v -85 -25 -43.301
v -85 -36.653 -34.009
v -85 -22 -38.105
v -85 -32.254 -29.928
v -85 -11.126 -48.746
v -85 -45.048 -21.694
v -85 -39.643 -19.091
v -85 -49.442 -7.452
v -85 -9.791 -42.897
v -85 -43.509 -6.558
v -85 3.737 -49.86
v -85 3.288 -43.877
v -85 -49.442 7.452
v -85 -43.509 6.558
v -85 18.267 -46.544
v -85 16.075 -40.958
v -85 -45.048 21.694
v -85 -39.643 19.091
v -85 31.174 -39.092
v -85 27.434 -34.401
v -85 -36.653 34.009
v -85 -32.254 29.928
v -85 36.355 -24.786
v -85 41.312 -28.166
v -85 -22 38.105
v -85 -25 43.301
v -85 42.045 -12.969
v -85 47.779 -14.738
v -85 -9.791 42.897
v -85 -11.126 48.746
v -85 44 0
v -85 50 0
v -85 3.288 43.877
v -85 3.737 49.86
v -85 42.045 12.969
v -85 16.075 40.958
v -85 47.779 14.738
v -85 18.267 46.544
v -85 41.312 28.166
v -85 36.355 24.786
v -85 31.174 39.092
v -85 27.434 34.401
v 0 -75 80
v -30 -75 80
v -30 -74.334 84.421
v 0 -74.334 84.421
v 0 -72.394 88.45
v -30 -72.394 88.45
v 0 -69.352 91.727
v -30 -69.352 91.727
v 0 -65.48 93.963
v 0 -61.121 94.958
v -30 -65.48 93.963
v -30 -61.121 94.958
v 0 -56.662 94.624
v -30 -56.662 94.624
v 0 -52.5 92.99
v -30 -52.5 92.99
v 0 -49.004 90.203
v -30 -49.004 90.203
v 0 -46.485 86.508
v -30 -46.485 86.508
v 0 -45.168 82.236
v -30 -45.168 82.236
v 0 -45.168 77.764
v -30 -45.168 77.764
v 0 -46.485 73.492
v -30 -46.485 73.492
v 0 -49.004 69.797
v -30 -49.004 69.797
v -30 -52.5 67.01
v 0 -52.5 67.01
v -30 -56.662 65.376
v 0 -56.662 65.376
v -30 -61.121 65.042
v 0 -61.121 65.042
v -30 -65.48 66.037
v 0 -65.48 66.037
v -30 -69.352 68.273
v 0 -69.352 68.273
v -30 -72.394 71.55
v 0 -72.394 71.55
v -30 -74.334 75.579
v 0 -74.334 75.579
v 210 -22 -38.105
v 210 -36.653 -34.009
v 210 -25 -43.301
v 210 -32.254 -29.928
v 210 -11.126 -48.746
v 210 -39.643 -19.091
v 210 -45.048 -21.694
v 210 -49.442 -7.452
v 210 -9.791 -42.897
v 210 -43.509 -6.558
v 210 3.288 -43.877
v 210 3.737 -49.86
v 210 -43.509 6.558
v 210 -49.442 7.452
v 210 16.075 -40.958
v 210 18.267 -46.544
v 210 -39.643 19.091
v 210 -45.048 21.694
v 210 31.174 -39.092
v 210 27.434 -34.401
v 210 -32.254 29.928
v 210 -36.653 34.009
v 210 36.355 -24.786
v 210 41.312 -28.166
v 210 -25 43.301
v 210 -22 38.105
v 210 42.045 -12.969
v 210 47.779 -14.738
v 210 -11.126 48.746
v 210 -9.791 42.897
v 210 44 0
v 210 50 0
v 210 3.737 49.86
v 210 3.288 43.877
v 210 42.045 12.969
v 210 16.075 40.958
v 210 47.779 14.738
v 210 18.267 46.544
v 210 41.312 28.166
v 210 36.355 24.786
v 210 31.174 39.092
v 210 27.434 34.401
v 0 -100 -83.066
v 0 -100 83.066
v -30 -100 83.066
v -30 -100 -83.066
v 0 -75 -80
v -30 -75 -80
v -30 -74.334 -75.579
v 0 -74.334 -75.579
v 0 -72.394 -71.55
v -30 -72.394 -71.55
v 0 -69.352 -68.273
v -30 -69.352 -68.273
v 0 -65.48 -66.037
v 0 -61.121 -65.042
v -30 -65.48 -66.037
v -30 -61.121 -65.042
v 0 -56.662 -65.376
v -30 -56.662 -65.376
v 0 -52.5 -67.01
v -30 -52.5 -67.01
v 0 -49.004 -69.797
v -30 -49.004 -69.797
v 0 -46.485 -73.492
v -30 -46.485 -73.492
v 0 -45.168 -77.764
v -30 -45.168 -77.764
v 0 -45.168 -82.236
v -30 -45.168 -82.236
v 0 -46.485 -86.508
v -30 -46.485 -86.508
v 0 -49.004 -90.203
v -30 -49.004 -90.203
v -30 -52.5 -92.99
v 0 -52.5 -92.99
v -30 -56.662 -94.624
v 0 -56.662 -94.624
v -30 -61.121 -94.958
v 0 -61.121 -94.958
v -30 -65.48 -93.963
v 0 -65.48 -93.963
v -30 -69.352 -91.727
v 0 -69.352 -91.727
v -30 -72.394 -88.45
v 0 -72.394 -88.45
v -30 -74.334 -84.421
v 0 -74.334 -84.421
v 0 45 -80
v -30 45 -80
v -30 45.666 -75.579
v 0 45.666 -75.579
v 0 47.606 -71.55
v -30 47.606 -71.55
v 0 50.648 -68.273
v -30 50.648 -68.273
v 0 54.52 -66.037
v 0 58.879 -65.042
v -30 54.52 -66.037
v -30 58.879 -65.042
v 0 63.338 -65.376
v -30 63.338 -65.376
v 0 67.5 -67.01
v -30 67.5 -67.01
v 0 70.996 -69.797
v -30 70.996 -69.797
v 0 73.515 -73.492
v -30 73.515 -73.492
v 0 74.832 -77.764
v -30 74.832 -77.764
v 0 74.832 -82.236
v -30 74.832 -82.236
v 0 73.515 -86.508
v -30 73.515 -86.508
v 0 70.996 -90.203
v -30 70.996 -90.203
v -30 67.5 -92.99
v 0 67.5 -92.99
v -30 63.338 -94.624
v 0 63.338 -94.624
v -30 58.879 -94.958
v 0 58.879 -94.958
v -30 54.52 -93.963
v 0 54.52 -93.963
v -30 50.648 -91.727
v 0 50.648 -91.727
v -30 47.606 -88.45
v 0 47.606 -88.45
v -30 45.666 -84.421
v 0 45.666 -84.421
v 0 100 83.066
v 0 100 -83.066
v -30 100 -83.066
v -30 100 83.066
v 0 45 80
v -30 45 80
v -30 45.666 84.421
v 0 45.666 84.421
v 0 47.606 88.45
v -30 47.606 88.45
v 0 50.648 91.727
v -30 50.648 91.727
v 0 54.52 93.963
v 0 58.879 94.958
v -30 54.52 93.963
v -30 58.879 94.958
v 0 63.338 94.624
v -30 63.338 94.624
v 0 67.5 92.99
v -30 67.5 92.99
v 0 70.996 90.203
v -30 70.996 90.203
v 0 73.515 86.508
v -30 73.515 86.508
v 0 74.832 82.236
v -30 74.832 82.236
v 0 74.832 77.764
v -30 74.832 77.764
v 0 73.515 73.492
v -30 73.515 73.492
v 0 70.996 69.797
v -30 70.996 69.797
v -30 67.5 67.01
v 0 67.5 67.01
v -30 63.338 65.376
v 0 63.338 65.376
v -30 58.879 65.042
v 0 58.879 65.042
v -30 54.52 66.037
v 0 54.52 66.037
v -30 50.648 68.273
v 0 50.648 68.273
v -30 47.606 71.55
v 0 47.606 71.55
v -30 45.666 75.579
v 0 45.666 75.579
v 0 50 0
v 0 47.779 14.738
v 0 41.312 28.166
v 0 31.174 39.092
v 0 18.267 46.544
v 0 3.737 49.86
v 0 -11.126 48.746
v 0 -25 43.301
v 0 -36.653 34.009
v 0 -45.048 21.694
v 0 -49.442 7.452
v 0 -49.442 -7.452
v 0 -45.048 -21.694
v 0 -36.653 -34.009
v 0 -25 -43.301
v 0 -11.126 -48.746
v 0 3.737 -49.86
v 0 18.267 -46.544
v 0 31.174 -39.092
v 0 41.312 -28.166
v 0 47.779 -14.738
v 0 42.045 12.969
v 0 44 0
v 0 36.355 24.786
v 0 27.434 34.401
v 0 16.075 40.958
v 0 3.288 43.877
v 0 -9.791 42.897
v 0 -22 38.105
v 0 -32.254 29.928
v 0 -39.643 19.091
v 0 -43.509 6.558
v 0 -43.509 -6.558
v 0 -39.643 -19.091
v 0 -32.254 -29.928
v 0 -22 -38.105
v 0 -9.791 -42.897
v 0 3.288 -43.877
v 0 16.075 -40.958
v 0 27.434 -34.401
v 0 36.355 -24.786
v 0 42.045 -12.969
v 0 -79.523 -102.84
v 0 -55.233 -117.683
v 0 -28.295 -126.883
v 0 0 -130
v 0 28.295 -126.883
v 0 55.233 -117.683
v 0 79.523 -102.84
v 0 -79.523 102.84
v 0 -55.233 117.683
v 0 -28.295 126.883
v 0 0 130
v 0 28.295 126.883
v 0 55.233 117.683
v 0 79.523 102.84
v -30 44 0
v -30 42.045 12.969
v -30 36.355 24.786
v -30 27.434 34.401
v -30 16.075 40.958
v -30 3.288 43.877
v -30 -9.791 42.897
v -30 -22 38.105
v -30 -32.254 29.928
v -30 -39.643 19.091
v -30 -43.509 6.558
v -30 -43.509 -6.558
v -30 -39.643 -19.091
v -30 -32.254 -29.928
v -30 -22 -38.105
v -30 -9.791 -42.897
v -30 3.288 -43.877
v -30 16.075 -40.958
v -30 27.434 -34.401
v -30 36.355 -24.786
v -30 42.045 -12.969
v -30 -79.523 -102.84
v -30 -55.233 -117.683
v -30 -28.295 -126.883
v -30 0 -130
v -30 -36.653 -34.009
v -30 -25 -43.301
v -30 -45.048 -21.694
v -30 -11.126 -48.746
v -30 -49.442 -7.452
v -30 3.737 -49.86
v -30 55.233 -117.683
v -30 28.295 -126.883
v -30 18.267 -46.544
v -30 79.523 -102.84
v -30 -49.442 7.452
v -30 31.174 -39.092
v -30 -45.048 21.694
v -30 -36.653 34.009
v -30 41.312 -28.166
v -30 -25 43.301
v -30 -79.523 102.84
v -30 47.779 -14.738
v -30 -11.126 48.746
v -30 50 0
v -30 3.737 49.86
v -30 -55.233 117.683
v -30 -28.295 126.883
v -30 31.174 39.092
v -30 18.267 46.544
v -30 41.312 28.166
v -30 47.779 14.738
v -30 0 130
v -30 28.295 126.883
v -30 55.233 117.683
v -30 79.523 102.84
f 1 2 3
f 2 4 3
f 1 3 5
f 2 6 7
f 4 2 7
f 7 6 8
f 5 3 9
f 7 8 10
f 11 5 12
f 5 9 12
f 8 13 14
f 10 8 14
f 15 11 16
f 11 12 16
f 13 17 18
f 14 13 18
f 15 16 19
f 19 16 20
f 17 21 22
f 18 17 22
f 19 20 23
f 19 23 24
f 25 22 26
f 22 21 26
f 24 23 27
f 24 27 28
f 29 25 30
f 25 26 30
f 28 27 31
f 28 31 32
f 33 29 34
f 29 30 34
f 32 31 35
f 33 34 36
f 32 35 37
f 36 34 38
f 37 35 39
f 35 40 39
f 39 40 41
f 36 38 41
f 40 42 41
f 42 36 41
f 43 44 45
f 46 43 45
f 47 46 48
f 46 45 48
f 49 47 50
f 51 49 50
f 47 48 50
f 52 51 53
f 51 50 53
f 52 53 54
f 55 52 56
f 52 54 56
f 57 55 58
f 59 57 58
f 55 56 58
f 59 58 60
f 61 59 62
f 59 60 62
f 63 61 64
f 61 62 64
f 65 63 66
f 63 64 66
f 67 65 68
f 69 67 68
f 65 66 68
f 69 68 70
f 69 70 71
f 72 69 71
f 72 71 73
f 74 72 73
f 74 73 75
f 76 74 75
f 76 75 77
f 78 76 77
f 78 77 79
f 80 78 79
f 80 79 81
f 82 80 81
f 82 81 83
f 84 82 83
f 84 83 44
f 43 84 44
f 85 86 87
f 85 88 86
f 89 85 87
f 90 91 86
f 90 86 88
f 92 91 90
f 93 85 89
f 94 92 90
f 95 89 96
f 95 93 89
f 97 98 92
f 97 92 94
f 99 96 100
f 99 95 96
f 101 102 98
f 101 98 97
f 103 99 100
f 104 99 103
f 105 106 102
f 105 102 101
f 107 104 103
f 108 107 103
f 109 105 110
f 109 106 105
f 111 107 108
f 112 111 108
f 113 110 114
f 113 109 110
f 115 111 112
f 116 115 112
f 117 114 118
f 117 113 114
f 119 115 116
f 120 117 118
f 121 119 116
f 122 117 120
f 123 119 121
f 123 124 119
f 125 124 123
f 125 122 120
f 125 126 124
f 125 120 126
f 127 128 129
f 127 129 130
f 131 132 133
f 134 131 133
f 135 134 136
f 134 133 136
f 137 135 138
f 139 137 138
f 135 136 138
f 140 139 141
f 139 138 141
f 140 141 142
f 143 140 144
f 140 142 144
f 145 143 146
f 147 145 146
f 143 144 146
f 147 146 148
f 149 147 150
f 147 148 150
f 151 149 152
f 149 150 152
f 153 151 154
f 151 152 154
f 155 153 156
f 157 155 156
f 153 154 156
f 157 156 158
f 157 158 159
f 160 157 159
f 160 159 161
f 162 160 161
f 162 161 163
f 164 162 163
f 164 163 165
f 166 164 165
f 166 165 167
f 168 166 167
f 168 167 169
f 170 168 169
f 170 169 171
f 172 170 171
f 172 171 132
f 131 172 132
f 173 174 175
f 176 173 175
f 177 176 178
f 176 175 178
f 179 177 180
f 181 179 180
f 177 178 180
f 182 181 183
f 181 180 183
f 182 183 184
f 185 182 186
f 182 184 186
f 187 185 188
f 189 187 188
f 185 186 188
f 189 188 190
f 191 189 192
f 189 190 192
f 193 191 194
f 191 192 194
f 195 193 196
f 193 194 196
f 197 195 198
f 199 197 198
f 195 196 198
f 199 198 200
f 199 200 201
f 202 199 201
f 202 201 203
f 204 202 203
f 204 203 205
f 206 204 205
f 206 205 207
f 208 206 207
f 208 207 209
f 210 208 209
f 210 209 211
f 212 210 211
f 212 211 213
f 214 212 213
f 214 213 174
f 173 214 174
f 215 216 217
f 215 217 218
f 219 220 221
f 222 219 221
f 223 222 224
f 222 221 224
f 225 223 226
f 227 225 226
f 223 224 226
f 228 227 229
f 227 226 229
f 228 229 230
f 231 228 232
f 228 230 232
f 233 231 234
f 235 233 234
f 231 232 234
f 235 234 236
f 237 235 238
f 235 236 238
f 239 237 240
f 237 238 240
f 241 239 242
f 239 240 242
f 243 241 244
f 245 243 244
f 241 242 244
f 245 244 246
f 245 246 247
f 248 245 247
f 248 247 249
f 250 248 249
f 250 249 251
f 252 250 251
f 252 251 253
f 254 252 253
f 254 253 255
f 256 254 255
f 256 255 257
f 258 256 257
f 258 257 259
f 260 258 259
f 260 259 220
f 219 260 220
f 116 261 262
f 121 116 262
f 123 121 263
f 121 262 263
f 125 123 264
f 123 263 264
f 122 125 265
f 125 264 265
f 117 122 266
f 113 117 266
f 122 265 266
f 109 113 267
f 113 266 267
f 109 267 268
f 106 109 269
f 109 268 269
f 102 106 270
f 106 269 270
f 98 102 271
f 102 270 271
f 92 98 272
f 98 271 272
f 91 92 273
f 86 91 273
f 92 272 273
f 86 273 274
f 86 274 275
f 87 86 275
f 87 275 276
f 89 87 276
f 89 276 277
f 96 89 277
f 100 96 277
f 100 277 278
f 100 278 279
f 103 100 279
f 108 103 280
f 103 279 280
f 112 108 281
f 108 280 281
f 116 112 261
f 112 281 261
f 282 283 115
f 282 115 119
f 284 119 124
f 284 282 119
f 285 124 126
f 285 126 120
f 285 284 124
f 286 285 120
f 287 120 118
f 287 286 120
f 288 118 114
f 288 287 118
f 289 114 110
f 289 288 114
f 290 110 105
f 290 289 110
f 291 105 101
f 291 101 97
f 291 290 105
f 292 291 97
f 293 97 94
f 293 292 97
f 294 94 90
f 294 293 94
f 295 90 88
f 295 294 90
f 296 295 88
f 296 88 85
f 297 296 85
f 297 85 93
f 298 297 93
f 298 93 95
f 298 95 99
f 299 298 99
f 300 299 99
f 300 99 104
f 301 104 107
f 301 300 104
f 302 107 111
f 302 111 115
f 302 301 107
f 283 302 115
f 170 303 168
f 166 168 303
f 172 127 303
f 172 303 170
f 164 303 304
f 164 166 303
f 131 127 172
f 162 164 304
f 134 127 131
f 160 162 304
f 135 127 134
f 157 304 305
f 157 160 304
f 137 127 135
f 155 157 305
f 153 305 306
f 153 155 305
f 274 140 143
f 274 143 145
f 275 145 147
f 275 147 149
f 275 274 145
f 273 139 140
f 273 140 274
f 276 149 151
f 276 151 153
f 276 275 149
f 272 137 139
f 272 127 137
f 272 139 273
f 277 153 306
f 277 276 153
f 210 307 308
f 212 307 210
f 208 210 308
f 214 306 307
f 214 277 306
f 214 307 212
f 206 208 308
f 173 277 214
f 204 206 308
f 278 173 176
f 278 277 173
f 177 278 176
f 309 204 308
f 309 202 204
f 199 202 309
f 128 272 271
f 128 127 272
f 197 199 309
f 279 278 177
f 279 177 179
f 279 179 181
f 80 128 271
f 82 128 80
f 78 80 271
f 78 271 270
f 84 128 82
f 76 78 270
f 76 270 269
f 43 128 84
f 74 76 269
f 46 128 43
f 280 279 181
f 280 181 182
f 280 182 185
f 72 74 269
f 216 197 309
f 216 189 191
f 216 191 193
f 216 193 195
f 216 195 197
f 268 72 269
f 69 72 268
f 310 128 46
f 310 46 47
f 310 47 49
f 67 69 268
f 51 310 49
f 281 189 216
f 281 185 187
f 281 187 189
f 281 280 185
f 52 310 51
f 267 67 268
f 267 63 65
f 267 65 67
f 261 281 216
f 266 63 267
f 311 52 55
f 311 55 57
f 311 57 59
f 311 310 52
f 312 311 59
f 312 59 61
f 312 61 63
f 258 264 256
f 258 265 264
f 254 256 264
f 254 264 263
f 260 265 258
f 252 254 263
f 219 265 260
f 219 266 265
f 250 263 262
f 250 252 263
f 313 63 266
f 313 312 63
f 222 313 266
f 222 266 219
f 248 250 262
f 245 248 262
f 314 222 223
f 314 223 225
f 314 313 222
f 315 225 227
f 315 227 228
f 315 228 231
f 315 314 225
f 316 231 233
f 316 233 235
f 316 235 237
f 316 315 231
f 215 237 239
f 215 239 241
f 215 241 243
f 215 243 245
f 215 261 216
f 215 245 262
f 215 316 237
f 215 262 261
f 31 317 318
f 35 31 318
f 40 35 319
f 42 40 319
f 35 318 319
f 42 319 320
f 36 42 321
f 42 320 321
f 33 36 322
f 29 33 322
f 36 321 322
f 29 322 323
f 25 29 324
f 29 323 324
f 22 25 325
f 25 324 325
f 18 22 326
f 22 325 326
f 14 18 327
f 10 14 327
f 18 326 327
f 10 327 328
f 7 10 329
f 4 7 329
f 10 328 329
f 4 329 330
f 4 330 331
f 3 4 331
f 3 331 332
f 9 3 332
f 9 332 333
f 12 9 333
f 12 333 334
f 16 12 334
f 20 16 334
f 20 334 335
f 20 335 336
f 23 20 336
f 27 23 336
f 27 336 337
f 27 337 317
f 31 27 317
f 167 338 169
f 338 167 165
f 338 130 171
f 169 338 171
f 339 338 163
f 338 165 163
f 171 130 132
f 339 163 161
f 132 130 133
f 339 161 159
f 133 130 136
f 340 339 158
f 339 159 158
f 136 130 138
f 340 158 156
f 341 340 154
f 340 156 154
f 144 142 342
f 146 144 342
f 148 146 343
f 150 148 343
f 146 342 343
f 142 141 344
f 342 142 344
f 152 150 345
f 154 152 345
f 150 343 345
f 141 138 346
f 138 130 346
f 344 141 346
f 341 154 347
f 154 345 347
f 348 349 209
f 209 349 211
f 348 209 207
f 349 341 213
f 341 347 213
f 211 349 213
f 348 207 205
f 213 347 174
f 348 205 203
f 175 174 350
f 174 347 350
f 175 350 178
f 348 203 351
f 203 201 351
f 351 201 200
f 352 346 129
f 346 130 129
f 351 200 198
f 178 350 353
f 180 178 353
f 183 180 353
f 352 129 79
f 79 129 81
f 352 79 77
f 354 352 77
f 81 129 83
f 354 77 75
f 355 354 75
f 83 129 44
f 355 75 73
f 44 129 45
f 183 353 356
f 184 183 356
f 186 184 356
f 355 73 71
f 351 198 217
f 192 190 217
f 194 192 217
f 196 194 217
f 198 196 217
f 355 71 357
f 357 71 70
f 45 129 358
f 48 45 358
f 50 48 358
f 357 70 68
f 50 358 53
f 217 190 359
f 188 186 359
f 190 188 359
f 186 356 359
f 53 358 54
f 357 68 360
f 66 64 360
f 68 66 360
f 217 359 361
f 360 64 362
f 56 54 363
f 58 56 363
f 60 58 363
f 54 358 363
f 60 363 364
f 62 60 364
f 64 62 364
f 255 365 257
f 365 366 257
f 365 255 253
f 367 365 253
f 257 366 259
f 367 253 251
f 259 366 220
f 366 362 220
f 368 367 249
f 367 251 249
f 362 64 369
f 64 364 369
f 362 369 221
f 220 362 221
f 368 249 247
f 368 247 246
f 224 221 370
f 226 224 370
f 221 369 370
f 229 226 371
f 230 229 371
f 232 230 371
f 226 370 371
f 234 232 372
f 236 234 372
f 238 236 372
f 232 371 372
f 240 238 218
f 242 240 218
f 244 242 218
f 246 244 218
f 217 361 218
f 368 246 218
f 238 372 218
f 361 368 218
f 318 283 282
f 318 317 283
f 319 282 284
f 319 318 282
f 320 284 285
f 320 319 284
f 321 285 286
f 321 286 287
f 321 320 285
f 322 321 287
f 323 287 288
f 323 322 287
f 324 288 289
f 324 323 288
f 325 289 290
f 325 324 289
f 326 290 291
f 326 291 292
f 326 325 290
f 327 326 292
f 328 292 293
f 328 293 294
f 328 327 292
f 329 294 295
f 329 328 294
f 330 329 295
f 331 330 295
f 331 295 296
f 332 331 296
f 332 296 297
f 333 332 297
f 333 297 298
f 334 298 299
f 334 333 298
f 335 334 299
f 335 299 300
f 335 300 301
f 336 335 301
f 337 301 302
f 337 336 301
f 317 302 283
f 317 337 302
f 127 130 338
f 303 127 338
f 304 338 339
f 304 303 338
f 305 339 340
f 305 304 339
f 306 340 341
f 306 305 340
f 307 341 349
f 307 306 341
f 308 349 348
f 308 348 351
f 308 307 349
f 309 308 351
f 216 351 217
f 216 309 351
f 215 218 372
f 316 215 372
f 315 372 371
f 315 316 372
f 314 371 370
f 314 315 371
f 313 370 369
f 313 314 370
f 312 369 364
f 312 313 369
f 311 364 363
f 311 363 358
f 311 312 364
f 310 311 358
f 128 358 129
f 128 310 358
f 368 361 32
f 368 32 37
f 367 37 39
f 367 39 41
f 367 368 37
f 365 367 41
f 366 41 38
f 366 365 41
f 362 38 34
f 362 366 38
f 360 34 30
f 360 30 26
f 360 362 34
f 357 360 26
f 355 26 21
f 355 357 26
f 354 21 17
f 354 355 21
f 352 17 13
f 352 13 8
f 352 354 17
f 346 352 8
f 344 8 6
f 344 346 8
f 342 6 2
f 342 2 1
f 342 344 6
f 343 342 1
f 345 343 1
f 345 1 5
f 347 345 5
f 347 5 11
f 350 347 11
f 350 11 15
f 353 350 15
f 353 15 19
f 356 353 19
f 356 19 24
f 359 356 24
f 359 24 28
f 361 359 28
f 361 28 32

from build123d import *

# Parameters (mm, degrees)
F0_R     = 50
F0_R_2   = 44
F1_DEPTH = 30
F2_D     = 30
F3_DEPTH = 210
F4_DEPTH = 85


with BuildPart() as f1:
    # F0 (on Right) → F1 (new body)
    with BuildSketch(Plane.YZ):
        with BuildLine():
            Line((100, -83.066239), (100, 83.066239))
            ThreePointArc((100, 83.066239), (0, 130), (-100, 83.066239))
            Line((-100, 83.066239), (-100, -83.066239))
            ThreePointArc((-100, -83.066239), (0, -130), (100, -83.066239))
        make_face()
        Circle(F0_R, mode=Mode.SUBTRACT)
        Circle(F0_R)
        Circle(F0_R_2, mode=Mode.SUBTRACT)
    extrude(amount=-F1_DEPTH)

    # F2 (through all)
    with Locations(Plane.YZ):
        with Locations((-60, 80), (60, 80), (60, -80), (-60, -80)):
            Hole(F2_D / 2)

    # F0 (on Right) → F3 (join)
    with BuildSketch(Plane.YZ):
        Circle(F0_R)
        Circle(F0_R_2, mode=Mode.SUBTRACT)
    extrude(amount=F3_DEPTH)

    # F0 (on Right) → F4 (join)
    with BuildSketch(Plane.YZ):
        Circle(F0_R)
        Circle(F0_R_2, mode=Mode.SUBTRACT)
    extrude(amount=-F4_DEPTH)


solid = f1.part
